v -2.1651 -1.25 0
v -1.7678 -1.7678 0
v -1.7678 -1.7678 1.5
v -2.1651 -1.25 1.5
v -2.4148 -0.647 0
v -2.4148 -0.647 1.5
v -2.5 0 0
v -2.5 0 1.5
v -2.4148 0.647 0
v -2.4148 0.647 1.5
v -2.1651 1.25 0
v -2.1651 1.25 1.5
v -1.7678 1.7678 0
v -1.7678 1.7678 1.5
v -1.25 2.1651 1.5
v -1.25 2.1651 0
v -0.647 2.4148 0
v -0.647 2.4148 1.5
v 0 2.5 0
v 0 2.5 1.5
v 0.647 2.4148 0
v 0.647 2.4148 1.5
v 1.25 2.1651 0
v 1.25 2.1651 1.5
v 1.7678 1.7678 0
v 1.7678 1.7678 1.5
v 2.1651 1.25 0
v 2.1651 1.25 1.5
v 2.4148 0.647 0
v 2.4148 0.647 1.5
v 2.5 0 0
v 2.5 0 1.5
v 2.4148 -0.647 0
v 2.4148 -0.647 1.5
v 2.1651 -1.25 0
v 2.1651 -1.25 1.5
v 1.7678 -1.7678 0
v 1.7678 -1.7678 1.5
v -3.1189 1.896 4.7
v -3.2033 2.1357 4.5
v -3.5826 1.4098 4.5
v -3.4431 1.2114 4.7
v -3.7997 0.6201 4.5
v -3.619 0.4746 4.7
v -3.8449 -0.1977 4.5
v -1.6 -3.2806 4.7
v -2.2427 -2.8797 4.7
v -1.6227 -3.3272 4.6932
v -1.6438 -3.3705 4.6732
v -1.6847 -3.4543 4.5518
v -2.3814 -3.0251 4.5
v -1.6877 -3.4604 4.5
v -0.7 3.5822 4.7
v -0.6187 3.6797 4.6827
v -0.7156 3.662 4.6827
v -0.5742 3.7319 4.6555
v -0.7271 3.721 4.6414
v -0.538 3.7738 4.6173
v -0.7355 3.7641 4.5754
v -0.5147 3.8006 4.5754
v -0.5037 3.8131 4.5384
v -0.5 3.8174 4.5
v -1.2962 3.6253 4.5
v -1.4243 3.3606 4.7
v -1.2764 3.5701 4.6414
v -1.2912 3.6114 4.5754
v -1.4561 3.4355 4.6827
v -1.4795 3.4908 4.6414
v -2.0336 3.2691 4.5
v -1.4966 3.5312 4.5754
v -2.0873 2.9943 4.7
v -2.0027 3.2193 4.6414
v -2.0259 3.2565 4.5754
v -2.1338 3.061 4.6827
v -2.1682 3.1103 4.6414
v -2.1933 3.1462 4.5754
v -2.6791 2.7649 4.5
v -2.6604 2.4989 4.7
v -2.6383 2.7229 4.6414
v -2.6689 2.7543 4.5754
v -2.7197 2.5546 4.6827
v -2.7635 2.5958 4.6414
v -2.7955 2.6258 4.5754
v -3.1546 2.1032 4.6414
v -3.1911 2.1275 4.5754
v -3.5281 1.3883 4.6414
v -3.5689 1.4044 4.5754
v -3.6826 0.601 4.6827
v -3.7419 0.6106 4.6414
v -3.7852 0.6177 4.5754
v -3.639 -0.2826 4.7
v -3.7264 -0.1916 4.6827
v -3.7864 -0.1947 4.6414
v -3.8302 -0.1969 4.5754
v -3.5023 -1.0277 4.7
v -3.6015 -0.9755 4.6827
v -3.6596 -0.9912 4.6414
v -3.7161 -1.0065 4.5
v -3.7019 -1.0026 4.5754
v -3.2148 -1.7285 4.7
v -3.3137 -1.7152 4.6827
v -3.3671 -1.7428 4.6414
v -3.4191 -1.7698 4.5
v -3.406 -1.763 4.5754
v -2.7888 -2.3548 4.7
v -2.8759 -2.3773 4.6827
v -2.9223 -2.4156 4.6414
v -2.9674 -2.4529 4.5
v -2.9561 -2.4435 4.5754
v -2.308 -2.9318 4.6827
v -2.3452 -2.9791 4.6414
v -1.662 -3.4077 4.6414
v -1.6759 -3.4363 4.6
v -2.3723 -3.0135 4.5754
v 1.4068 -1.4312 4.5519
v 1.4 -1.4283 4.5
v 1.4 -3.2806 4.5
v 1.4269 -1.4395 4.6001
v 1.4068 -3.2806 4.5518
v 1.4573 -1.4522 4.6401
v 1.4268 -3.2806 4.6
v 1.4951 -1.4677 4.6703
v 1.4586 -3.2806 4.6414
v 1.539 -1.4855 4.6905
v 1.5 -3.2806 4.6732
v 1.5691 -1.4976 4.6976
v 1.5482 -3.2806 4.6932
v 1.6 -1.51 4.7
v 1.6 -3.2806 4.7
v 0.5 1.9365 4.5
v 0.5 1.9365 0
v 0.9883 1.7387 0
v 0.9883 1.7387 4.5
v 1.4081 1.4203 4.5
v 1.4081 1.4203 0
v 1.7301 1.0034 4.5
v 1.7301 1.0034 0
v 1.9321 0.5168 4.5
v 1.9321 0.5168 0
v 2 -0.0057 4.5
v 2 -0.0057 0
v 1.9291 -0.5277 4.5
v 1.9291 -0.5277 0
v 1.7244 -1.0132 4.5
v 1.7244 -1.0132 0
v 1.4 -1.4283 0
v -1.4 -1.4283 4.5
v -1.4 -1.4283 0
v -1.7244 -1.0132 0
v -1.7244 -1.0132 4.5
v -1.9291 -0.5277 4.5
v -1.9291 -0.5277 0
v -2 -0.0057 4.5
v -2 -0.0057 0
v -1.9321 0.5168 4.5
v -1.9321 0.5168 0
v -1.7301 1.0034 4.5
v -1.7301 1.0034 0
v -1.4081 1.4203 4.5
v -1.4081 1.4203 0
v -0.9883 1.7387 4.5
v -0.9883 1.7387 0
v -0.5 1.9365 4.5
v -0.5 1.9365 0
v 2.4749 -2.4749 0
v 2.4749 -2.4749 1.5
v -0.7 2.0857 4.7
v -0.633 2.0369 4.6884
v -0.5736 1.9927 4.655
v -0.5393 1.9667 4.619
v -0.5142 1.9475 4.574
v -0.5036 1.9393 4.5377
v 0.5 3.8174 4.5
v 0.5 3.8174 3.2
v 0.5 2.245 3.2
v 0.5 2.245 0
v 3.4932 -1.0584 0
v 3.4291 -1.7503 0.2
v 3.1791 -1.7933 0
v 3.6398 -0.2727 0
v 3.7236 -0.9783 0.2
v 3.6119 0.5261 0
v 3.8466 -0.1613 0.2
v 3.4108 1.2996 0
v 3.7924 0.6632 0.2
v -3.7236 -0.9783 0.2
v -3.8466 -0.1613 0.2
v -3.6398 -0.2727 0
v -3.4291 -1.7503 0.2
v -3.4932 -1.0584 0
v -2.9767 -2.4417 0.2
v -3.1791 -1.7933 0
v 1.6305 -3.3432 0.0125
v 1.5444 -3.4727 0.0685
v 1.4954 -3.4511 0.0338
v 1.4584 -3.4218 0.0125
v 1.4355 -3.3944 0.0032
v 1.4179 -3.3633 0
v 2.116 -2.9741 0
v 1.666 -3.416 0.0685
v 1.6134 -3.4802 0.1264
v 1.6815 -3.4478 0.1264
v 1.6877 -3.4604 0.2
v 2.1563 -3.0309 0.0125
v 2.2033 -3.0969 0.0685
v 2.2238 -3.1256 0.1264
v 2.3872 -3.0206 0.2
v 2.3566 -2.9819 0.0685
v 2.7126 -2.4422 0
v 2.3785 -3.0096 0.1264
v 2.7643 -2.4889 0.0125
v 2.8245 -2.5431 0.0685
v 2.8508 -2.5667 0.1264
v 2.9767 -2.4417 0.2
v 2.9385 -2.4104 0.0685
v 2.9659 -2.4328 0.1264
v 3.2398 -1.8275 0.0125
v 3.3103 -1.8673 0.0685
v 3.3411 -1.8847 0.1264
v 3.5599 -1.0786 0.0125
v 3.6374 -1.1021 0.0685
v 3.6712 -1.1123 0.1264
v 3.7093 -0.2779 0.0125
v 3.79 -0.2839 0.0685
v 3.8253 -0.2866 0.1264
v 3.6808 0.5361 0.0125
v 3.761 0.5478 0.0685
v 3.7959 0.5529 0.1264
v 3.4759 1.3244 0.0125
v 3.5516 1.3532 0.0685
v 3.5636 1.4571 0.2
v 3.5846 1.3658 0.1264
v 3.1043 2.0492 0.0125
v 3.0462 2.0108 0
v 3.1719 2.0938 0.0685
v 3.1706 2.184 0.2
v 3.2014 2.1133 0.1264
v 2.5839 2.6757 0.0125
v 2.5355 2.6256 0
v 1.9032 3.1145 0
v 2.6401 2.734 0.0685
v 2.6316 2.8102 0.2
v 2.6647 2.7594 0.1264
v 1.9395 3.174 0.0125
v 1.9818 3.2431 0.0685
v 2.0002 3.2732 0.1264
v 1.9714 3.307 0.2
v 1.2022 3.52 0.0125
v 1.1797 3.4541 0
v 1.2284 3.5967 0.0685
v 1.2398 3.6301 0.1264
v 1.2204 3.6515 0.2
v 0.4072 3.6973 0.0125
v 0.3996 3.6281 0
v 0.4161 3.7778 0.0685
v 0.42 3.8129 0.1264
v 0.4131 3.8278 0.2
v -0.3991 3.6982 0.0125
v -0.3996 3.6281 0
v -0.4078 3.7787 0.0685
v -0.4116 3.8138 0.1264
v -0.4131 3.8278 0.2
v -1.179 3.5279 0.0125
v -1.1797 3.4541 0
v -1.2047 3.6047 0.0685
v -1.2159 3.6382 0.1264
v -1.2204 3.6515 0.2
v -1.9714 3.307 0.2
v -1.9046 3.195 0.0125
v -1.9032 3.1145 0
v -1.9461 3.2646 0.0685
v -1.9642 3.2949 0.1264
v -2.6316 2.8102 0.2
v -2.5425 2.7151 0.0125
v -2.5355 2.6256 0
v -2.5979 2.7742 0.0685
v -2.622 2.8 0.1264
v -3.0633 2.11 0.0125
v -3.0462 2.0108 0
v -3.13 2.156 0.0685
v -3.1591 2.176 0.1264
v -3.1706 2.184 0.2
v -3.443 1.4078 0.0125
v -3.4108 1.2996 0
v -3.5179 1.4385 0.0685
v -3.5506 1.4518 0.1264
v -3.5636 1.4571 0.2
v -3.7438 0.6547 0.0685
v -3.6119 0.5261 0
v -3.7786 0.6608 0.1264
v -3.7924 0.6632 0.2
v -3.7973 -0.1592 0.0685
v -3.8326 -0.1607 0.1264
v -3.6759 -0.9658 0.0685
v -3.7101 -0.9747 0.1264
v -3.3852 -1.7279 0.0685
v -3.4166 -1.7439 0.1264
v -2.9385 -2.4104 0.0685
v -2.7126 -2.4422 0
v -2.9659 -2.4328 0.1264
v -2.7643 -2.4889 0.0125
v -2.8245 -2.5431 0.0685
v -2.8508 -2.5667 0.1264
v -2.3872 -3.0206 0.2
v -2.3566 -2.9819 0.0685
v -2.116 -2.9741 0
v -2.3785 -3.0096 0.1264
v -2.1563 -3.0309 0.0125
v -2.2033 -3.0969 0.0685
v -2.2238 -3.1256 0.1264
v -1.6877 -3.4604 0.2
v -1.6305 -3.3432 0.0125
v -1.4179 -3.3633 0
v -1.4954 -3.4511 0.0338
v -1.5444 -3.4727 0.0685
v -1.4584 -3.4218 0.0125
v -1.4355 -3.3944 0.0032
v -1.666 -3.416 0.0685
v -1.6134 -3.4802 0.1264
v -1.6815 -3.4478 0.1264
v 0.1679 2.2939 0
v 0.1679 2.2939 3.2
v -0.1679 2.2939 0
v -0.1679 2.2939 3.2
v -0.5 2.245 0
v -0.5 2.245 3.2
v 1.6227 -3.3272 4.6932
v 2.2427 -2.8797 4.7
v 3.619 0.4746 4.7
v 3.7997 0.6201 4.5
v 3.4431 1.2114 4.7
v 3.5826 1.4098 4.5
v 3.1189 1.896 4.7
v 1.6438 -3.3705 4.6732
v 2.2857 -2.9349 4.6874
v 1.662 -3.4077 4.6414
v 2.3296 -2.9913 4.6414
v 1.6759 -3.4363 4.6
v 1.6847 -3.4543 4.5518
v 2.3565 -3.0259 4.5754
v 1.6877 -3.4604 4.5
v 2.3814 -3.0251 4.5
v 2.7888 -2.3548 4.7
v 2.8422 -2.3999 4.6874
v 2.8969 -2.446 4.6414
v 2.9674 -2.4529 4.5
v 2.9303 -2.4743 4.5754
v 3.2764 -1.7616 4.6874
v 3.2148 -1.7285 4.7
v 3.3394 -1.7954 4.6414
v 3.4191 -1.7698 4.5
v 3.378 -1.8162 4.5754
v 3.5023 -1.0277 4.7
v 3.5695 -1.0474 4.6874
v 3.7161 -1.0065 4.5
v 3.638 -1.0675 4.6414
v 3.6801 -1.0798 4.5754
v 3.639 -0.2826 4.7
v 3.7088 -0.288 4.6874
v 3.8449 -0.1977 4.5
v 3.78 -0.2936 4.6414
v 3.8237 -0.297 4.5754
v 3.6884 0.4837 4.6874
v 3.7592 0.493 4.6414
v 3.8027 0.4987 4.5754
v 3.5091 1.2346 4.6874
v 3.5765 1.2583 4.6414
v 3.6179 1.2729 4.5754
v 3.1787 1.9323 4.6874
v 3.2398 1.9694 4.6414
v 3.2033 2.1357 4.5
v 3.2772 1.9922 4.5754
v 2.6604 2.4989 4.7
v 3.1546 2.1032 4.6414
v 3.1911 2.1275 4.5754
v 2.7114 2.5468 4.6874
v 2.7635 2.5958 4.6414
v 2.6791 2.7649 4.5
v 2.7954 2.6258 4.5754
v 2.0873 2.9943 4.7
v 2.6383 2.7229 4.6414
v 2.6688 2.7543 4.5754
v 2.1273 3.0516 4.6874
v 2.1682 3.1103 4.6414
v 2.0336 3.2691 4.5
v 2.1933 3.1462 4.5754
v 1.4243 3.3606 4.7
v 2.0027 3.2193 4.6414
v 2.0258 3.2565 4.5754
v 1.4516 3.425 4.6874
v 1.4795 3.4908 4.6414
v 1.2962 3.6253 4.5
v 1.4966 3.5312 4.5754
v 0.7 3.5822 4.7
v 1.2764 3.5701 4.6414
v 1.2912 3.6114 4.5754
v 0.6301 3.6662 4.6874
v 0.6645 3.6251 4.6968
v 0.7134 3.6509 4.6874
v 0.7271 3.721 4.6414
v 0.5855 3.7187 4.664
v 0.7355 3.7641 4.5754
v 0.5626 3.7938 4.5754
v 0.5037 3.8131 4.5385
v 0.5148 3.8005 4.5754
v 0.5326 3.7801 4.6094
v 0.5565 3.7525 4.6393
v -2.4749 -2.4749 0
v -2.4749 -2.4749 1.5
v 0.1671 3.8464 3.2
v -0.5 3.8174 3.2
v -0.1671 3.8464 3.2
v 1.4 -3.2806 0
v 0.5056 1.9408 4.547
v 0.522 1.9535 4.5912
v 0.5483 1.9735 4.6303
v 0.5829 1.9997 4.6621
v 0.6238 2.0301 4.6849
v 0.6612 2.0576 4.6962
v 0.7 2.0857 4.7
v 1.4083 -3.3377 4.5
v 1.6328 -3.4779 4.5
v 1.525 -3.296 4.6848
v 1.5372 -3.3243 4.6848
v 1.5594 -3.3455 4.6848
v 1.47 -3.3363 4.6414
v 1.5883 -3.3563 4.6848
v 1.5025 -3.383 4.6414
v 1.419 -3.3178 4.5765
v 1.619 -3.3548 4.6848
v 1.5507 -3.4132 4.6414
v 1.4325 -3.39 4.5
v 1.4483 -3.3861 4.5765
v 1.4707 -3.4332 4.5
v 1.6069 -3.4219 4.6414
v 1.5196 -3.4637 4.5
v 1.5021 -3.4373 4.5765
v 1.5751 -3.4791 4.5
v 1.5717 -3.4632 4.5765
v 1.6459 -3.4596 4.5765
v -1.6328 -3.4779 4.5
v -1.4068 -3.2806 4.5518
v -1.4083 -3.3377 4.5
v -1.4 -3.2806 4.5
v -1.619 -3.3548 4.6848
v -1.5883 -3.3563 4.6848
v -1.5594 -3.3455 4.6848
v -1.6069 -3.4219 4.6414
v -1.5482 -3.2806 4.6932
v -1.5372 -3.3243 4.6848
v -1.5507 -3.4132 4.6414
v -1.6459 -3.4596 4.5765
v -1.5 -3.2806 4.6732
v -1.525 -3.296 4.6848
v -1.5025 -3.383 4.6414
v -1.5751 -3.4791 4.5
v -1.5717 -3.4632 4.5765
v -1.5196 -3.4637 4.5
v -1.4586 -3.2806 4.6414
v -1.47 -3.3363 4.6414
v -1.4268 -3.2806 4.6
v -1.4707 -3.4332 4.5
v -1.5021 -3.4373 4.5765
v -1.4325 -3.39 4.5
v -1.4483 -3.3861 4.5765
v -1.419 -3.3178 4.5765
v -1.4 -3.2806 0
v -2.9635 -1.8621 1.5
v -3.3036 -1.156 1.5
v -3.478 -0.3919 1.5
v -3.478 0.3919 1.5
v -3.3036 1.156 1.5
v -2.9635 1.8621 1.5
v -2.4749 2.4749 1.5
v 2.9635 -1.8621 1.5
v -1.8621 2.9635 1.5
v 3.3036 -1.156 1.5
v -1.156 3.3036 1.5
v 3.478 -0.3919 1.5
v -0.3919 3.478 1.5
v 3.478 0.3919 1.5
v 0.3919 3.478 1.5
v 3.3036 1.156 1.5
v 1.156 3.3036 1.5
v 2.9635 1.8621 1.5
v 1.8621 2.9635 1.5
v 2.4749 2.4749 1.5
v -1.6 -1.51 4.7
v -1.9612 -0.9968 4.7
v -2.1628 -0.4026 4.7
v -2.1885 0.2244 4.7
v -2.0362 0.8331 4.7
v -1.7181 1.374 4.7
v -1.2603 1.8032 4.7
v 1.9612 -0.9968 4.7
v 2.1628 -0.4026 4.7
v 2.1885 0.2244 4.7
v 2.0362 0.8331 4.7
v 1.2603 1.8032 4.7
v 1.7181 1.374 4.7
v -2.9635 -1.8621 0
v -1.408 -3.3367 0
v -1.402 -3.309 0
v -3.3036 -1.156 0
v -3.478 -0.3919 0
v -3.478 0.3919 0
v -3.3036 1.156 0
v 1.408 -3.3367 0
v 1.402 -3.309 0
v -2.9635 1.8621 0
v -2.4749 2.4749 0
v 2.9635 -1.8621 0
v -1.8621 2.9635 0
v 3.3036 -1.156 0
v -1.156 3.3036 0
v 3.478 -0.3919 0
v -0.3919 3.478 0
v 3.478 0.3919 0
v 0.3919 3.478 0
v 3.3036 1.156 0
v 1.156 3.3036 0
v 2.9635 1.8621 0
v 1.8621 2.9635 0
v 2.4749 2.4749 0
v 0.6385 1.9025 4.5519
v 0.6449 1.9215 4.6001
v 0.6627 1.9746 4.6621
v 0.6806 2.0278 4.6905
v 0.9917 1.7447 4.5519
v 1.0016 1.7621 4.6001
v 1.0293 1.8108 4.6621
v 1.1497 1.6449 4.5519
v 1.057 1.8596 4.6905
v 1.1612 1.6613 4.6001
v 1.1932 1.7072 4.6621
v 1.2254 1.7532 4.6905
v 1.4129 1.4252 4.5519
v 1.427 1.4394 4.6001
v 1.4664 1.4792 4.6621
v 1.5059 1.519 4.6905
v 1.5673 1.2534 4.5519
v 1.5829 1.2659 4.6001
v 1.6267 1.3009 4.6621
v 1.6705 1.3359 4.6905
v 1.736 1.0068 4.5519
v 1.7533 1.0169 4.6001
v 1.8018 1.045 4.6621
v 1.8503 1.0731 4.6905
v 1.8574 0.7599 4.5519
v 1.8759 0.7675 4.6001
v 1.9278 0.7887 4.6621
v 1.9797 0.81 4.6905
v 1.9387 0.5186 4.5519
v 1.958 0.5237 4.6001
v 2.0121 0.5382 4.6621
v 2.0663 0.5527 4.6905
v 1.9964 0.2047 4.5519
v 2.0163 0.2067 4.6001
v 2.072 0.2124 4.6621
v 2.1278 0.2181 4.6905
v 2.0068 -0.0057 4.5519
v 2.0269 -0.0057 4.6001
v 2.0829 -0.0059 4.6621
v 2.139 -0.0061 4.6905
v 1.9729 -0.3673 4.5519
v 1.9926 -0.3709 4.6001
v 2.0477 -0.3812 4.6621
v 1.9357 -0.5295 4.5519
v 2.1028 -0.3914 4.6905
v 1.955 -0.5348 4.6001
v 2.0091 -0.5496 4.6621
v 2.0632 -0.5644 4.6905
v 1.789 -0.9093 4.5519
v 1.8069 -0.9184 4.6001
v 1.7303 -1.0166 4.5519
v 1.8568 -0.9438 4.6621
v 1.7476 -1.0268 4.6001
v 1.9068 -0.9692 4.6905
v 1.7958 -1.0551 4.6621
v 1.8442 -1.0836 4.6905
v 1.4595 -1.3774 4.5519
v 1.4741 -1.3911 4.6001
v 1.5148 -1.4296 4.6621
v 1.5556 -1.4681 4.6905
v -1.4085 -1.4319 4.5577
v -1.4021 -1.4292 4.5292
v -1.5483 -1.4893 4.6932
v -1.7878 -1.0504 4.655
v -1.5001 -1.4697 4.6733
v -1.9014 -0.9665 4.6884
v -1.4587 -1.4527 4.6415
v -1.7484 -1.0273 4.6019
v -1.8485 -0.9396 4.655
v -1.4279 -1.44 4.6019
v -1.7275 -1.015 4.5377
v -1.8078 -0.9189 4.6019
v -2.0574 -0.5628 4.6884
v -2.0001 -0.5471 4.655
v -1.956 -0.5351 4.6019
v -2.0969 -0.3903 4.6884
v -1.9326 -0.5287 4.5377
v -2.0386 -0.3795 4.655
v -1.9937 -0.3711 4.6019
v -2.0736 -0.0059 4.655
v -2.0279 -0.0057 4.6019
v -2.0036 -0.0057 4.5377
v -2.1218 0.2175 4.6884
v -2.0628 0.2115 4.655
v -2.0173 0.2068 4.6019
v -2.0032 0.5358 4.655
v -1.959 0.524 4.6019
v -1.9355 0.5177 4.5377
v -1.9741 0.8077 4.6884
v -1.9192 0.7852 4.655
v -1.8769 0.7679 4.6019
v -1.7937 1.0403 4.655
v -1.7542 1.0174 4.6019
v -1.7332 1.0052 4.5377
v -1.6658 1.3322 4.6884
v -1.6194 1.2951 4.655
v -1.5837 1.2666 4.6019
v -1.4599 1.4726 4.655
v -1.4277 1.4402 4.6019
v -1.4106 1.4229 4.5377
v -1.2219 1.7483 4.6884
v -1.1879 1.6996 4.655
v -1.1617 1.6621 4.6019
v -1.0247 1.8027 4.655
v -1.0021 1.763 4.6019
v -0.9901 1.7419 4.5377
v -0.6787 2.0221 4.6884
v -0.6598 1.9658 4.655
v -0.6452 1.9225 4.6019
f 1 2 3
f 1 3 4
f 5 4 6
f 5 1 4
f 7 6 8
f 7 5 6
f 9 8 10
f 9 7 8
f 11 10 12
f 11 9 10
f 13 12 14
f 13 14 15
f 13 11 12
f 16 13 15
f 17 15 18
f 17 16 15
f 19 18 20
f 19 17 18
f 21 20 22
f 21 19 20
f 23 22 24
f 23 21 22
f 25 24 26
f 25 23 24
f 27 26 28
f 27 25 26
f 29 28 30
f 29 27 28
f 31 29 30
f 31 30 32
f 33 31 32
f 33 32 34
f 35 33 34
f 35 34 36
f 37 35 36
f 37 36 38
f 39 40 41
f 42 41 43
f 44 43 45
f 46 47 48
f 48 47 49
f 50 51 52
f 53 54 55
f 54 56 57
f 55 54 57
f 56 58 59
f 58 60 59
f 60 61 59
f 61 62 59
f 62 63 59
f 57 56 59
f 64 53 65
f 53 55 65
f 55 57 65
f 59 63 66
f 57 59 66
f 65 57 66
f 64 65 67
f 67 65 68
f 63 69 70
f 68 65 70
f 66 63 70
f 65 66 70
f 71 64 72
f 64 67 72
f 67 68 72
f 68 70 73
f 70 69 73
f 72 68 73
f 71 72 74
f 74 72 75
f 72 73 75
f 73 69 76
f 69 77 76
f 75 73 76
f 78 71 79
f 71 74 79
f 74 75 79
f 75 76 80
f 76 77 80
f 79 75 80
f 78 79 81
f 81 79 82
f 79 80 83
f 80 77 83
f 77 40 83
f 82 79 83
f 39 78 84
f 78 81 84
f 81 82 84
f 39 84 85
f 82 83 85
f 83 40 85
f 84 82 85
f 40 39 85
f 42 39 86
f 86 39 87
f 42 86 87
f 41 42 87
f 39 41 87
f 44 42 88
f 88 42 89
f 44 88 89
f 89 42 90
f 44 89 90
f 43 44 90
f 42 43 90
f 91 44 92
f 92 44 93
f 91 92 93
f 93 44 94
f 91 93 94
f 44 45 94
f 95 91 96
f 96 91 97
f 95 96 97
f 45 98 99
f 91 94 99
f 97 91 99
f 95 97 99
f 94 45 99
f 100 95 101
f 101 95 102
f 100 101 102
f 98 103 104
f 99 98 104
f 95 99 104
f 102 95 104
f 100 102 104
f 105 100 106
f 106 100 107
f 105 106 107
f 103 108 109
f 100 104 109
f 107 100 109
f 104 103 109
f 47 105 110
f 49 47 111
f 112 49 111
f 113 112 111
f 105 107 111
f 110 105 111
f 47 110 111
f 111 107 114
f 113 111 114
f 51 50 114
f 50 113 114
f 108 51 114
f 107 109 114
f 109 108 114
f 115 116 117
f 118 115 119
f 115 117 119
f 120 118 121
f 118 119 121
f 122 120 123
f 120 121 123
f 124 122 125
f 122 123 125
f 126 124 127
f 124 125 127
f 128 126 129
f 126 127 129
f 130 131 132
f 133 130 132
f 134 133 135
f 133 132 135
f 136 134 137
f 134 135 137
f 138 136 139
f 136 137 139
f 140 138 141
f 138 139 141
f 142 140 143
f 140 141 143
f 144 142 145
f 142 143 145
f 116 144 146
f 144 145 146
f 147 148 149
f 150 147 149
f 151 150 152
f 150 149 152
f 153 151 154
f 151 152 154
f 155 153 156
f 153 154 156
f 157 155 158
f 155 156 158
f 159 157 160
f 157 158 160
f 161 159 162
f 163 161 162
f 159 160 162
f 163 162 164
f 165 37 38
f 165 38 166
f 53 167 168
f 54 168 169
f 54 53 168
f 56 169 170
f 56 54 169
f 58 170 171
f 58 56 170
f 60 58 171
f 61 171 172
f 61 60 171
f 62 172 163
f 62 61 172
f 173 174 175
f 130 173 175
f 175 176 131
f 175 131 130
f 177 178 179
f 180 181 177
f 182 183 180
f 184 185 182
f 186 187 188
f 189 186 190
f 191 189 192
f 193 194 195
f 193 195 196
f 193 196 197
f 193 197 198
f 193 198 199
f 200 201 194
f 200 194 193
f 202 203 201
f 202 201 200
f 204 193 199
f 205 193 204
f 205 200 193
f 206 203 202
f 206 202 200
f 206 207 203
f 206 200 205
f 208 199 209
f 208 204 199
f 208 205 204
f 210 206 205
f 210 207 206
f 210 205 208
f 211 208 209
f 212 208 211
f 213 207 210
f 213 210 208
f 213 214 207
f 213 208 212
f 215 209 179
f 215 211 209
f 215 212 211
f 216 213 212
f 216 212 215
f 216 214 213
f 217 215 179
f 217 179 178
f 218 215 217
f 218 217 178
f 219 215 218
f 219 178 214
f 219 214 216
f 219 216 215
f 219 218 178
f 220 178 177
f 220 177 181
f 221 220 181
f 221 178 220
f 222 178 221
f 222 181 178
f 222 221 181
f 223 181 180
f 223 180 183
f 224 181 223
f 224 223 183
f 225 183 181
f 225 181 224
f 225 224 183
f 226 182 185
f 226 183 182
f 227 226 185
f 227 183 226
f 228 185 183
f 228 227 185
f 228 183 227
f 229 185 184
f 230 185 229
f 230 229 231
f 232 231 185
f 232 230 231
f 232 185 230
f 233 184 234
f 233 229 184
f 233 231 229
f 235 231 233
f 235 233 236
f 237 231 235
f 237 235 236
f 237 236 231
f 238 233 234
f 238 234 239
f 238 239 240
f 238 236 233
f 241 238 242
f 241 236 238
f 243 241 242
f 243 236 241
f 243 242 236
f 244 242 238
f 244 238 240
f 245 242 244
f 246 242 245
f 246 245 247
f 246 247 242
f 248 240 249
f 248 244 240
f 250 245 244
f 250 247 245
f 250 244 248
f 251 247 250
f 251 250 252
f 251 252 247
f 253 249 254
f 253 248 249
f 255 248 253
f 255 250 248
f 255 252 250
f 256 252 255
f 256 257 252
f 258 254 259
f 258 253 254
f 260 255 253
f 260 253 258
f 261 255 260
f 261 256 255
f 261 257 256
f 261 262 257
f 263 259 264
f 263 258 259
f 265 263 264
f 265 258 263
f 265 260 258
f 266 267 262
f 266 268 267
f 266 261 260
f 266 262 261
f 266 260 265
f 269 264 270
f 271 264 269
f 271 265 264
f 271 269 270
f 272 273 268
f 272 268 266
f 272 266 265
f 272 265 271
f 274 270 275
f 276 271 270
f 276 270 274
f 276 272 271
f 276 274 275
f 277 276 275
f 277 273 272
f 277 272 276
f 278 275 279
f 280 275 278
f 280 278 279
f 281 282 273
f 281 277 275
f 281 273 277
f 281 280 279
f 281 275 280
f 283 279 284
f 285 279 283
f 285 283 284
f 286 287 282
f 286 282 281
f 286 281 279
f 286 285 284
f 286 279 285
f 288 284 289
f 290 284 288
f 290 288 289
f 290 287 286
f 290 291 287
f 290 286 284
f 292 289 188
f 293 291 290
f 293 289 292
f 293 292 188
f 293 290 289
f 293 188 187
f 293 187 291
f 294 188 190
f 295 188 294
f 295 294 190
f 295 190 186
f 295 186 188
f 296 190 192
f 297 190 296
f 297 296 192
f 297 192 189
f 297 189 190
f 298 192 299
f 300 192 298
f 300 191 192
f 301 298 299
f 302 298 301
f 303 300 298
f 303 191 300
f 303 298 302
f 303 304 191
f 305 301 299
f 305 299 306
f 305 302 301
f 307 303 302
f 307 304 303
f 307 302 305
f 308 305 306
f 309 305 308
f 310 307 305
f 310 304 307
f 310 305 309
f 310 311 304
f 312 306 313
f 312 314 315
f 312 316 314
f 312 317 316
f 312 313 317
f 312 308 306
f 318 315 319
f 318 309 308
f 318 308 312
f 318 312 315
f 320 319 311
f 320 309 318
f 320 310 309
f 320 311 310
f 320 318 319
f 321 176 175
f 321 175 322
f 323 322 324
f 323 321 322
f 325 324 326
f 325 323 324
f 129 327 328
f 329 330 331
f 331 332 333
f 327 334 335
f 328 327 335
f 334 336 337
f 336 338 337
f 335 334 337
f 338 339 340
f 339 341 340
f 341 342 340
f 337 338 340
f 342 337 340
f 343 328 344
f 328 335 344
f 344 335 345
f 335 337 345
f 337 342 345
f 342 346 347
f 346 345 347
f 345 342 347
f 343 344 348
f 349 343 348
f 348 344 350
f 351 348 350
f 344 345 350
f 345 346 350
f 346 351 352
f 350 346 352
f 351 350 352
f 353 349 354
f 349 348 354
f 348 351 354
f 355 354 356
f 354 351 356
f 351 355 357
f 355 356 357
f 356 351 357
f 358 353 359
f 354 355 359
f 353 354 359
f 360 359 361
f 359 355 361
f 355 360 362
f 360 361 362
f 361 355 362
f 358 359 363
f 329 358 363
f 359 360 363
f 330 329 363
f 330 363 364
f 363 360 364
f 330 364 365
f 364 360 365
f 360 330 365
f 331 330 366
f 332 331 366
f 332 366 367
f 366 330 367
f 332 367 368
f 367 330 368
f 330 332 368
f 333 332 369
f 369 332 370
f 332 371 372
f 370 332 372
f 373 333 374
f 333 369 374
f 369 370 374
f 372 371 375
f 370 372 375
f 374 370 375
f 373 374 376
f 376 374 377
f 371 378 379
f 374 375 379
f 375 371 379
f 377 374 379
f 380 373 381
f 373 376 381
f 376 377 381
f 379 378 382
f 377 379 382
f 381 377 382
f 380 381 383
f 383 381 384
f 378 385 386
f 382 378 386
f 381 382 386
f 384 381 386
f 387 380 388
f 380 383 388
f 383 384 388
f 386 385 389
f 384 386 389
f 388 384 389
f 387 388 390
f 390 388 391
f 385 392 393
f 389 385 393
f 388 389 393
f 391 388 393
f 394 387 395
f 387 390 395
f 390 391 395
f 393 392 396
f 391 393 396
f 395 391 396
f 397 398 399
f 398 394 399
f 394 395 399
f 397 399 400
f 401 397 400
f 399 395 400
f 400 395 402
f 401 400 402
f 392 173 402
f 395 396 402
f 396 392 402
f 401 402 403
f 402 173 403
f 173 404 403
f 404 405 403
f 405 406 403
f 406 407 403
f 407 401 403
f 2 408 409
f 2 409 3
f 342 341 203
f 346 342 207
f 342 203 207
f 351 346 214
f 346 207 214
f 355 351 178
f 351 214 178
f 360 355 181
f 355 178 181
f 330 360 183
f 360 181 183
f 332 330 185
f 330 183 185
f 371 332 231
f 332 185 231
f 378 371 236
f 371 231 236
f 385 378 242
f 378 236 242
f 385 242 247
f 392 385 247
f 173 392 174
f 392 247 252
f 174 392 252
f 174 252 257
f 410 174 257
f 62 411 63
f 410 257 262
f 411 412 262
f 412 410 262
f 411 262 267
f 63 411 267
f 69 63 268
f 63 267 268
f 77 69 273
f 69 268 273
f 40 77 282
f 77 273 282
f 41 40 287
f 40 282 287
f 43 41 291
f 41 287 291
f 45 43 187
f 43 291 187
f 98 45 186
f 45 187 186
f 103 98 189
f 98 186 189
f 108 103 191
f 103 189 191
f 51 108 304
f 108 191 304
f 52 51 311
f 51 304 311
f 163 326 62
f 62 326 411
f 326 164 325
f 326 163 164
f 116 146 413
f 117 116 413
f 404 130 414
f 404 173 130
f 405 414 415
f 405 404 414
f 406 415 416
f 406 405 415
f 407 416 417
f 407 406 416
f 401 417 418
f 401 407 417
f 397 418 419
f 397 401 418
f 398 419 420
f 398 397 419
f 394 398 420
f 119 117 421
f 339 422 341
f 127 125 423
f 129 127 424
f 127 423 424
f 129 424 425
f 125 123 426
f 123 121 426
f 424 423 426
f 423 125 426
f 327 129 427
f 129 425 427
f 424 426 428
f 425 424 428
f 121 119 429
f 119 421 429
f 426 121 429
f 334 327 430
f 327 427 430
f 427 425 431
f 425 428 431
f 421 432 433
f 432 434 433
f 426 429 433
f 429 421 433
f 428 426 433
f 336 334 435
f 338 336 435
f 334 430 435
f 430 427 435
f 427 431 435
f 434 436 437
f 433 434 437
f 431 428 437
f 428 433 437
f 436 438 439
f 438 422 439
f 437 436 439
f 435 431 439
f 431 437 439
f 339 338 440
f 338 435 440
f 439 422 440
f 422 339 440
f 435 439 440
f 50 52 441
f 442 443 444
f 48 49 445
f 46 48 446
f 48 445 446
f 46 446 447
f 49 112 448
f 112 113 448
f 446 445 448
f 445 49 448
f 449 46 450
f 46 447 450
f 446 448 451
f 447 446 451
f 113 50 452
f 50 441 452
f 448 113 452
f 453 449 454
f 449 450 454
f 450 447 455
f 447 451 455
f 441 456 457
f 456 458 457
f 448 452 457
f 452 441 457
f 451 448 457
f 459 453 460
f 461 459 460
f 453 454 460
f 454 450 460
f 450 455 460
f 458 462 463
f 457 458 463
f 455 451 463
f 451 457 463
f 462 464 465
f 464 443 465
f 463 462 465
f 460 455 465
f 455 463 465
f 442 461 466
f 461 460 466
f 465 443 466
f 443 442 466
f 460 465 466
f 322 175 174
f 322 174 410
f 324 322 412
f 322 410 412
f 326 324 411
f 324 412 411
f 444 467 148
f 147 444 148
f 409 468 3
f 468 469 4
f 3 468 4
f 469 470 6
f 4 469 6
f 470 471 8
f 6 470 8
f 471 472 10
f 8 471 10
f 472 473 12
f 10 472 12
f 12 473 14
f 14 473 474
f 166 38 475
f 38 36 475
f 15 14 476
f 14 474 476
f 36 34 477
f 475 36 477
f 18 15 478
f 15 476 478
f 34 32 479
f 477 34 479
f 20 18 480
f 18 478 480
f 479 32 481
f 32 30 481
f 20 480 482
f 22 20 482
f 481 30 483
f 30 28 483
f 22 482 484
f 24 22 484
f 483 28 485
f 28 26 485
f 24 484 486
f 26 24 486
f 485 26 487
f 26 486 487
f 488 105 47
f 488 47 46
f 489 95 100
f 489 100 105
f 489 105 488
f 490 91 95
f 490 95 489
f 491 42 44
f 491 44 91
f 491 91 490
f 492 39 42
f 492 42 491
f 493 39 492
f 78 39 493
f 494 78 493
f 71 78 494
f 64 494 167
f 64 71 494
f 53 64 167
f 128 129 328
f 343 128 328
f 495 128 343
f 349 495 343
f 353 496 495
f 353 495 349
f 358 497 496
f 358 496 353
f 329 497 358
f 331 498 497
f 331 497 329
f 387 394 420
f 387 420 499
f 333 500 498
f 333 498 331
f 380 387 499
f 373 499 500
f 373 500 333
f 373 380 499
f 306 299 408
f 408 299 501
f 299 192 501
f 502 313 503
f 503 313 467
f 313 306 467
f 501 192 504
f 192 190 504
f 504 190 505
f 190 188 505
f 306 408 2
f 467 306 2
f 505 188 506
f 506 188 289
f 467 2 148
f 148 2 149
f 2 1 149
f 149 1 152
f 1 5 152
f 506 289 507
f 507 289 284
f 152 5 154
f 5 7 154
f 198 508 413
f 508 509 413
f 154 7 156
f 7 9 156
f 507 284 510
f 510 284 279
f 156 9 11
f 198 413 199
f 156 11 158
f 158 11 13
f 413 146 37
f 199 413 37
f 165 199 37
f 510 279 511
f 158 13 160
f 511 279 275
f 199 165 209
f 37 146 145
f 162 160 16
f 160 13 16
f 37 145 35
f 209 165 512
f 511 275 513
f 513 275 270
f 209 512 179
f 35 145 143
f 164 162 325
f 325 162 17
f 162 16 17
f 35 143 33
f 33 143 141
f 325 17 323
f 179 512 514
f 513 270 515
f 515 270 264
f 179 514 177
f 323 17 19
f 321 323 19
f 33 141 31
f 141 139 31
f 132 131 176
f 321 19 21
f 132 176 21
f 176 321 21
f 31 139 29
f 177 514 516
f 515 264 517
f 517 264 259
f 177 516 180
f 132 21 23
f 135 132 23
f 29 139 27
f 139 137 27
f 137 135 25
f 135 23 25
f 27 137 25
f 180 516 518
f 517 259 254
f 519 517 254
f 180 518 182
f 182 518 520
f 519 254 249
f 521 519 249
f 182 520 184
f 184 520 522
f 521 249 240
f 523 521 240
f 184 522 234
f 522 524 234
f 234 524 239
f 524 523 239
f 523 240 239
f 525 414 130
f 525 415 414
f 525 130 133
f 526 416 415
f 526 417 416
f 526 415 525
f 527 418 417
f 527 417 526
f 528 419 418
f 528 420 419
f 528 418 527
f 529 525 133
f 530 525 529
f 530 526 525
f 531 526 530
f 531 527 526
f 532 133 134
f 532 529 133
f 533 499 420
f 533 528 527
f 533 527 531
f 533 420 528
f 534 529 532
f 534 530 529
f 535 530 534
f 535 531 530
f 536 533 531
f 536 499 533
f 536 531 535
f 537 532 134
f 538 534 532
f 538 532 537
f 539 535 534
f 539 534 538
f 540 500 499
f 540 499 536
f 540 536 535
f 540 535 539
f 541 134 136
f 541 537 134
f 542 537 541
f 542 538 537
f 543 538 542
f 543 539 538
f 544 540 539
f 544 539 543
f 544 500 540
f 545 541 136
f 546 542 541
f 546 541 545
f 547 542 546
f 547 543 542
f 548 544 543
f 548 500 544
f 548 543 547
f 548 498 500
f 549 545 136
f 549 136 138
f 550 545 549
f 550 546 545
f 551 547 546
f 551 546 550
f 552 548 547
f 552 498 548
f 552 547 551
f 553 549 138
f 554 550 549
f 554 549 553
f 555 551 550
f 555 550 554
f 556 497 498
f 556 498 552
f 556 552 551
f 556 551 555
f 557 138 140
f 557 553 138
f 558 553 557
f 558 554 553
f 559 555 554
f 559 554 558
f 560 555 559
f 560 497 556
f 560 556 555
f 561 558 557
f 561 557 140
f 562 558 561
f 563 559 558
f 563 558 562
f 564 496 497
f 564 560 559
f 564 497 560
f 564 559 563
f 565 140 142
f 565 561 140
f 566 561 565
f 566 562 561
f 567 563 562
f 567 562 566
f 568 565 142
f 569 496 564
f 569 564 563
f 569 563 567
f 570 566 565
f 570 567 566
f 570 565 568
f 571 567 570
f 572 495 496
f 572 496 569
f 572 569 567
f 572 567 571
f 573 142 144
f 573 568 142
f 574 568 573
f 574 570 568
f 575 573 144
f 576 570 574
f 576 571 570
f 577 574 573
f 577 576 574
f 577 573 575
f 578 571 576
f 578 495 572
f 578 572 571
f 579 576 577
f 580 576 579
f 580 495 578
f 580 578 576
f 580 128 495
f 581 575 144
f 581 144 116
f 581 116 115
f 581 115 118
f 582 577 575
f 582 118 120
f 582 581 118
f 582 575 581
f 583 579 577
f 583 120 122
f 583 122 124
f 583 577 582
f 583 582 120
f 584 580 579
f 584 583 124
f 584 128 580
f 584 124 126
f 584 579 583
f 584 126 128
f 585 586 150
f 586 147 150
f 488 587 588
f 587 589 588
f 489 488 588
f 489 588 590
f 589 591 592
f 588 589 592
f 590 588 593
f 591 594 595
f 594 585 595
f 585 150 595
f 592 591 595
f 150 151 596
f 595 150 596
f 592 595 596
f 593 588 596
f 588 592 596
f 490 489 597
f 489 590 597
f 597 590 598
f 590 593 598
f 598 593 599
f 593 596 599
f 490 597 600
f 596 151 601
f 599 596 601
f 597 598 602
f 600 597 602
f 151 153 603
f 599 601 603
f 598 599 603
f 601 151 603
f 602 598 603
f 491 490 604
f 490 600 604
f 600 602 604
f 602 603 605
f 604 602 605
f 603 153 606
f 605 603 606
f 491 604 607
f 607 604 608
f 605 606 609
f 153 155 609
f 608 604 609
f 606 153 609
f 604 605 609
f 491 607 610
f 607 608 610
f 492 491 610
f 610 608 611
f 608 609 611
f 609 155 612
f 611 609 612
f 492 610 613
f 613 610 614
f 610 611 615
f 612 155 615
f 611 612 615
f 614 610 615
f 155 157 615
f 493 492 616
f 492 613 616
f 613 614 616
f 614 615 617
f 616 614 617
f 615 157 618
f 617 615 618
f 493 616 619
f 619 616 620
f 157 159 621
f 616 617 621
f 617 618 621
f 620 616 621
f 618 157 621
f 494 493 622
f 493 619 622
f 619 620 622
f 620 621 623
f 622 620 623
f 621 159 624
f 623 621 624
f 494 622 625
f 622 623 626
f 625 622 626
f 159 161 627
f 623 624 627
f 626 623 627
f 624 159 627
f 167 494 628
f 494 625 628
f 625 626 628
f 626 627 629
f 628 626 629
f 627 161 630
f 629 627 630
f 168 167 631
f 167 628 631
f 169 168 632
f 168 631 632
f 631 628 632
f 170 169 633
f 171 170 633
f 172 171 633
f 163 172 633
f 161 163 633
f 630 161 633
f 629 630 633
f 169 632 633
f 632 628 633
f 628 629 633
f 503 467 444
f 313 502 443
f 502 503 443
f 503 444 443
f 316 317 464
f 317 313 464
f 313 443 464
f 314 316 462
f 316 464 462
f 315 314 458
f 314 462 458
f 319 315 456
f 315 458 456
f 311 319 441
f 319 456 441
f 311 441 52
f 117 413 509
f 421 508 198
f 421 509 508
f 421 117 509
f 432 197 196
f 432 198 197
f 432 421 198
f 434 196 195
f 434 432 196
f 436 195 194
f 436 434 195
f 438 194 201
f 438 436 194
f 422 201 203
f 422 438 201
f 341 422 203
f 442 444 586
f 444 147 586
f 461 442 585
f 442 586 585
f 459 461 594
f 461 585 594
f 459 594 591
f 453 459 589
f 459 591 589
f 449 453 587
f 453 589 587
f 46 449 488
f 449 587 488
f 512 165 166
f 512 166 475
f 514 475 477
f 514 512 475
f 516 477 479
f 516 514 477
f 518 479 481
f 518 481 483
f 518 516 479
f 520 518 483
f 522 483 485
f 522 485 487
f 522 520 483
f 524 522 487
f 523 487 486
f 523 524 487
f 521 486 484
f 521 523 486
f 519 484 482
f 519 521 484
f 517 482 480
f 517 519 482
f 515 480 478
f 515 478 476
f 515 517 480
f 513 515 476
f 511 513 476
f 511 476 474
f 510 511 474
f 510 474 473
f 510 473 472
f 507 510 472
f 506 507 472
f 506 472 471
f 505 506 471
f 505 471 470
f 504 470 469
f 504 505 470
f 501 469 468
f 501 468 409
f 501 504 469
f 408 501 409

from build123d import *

# Parameters (mm, degrees)
EXTRUDE_1_DEPTH     = 4.7
CUT_EXTRUDE_START   = -1.5
CUT_EXTRUDE_1_DEPTH = 1.5
CUT_EXTRUDE_2_DEPTH = 1.5
CUT_EXTRUDE_3_DEPTH = 8.192704637
FILLET_1_R          = 0.2


with BuildPart() as part:
    # 草图1 → 凸台-拉伸1 (new body)
    with BuildSketch(Plane.XY):
        with BuildLine():
            Line((-1.4, -3.586432768), (-1.4, -1.428285686))
            ThreePointArc((-1.4, -1.428285686), (0, 2), (1.4, -1.428285686))
            Line((1.4, -1.428285686), (1.4, -3.586432768))
            ThreePointArc((1.4, -3.586432768), (0, 3.85), (-1.4, -3.586432768))
        make_face()
    extrude(amount=EXTRUDE_1_DEPTH)

    # 草图2 → 切除-拉伸1 (cut)
    with BuildSketch(Plane.XY.offset(4.7).offset(CUT_EXTRUDE_START)):
        with BuildLine():
            Line((-0.5, 1.936491673), (-0.5, 3.817394399))
            ThreePointArc((-0.5, 3.817394399), (0, 3.85), (0.5, 3.817394399))
            Line((0.5, 3.817394399), (0.5, 1.936491673))
            ThreePointArc((0.5, 1.936491673), (0, 2), (-0.5, 1.936491673))
        make_face()
    extrude(amount=CUT_EXTRUDE_1_DEPTH, mode=Mode.SUBTRACT)

    # 草图3 → 切除-拉伸2 (cut)
    with BuildSketch(Plane(origin=(0, 0, 0), x_dir=(-1, 0, 0), z_dir=(0, 0, -1))):
        with BuildLine():
            Line((-1.767766953, -1.767766953), (-2.474873734, -2.474873734))
            ThreePointArc((-2.474873734, -2.474873734), (0, 3.5), (2.474873734, -2.474873734))
            Line((2.474873734, -2.474873734), (1.767766953, -1.767766953))
            ThreePointArc((1.767766953, -1.767766953), (0, 2.5), (-1.767766953, -1.767766953))
        make_face()
    extrude(amount=-CUT_EXTRUDE_2_DEPTH, mode=Mode.SUBTRACT)

    # 草图4 → 切除-拉伸3 (cut, through all)
    with BuildSketch(Plane(origin=(0, 0, 0), x_dir=(-1, 0, 0), z_dir=(0, 0, -1))):
        with BuildLine():
            Line((-0.5, 1.936491673), (-0.5, 2.244994432))
            ThreePointArc((-0.5, 2.244994432), (0, 2.3), (0.5, 2.244994432))
            Line((0.5, 2.244994432), (0.5, 1.936491673))
            ThreePointArc((0.5, 1.936491673), (0, 2), (-0.5, 1.936491673))
        make_face()
    extrude(amount=-CUT_EXTRUDE_3_DEPTH, mode=Mode.SUBTRACT)

    # 圆角1
    fillet_1_edges = [part.edges().sort_by_distance(p)[0] for p in [
        (-1.932079623, 0.516786543, 4.7),
        (1.4, -2.507359227, 4.7),
        (-3.821866583, 0.464581337, 4.7),
        (1.932079623, 0.516786543, 4.7),
        (0.5, 2.876943036, 4.7),
        (-0.5, 2.876943036, 4.7),
        (3.821866583, 0.464581337, 4.7),
        (0, 3.85, 0),
        (-1.4, -2.507359227, 4.7),
        (1.4, -3.586432768, 2.35),
        (-1.4, -3.586432768, 2.35),
    ]]
    fillet(fillet_1_edges, radius=FILLET_1_R)


solid = part.part
